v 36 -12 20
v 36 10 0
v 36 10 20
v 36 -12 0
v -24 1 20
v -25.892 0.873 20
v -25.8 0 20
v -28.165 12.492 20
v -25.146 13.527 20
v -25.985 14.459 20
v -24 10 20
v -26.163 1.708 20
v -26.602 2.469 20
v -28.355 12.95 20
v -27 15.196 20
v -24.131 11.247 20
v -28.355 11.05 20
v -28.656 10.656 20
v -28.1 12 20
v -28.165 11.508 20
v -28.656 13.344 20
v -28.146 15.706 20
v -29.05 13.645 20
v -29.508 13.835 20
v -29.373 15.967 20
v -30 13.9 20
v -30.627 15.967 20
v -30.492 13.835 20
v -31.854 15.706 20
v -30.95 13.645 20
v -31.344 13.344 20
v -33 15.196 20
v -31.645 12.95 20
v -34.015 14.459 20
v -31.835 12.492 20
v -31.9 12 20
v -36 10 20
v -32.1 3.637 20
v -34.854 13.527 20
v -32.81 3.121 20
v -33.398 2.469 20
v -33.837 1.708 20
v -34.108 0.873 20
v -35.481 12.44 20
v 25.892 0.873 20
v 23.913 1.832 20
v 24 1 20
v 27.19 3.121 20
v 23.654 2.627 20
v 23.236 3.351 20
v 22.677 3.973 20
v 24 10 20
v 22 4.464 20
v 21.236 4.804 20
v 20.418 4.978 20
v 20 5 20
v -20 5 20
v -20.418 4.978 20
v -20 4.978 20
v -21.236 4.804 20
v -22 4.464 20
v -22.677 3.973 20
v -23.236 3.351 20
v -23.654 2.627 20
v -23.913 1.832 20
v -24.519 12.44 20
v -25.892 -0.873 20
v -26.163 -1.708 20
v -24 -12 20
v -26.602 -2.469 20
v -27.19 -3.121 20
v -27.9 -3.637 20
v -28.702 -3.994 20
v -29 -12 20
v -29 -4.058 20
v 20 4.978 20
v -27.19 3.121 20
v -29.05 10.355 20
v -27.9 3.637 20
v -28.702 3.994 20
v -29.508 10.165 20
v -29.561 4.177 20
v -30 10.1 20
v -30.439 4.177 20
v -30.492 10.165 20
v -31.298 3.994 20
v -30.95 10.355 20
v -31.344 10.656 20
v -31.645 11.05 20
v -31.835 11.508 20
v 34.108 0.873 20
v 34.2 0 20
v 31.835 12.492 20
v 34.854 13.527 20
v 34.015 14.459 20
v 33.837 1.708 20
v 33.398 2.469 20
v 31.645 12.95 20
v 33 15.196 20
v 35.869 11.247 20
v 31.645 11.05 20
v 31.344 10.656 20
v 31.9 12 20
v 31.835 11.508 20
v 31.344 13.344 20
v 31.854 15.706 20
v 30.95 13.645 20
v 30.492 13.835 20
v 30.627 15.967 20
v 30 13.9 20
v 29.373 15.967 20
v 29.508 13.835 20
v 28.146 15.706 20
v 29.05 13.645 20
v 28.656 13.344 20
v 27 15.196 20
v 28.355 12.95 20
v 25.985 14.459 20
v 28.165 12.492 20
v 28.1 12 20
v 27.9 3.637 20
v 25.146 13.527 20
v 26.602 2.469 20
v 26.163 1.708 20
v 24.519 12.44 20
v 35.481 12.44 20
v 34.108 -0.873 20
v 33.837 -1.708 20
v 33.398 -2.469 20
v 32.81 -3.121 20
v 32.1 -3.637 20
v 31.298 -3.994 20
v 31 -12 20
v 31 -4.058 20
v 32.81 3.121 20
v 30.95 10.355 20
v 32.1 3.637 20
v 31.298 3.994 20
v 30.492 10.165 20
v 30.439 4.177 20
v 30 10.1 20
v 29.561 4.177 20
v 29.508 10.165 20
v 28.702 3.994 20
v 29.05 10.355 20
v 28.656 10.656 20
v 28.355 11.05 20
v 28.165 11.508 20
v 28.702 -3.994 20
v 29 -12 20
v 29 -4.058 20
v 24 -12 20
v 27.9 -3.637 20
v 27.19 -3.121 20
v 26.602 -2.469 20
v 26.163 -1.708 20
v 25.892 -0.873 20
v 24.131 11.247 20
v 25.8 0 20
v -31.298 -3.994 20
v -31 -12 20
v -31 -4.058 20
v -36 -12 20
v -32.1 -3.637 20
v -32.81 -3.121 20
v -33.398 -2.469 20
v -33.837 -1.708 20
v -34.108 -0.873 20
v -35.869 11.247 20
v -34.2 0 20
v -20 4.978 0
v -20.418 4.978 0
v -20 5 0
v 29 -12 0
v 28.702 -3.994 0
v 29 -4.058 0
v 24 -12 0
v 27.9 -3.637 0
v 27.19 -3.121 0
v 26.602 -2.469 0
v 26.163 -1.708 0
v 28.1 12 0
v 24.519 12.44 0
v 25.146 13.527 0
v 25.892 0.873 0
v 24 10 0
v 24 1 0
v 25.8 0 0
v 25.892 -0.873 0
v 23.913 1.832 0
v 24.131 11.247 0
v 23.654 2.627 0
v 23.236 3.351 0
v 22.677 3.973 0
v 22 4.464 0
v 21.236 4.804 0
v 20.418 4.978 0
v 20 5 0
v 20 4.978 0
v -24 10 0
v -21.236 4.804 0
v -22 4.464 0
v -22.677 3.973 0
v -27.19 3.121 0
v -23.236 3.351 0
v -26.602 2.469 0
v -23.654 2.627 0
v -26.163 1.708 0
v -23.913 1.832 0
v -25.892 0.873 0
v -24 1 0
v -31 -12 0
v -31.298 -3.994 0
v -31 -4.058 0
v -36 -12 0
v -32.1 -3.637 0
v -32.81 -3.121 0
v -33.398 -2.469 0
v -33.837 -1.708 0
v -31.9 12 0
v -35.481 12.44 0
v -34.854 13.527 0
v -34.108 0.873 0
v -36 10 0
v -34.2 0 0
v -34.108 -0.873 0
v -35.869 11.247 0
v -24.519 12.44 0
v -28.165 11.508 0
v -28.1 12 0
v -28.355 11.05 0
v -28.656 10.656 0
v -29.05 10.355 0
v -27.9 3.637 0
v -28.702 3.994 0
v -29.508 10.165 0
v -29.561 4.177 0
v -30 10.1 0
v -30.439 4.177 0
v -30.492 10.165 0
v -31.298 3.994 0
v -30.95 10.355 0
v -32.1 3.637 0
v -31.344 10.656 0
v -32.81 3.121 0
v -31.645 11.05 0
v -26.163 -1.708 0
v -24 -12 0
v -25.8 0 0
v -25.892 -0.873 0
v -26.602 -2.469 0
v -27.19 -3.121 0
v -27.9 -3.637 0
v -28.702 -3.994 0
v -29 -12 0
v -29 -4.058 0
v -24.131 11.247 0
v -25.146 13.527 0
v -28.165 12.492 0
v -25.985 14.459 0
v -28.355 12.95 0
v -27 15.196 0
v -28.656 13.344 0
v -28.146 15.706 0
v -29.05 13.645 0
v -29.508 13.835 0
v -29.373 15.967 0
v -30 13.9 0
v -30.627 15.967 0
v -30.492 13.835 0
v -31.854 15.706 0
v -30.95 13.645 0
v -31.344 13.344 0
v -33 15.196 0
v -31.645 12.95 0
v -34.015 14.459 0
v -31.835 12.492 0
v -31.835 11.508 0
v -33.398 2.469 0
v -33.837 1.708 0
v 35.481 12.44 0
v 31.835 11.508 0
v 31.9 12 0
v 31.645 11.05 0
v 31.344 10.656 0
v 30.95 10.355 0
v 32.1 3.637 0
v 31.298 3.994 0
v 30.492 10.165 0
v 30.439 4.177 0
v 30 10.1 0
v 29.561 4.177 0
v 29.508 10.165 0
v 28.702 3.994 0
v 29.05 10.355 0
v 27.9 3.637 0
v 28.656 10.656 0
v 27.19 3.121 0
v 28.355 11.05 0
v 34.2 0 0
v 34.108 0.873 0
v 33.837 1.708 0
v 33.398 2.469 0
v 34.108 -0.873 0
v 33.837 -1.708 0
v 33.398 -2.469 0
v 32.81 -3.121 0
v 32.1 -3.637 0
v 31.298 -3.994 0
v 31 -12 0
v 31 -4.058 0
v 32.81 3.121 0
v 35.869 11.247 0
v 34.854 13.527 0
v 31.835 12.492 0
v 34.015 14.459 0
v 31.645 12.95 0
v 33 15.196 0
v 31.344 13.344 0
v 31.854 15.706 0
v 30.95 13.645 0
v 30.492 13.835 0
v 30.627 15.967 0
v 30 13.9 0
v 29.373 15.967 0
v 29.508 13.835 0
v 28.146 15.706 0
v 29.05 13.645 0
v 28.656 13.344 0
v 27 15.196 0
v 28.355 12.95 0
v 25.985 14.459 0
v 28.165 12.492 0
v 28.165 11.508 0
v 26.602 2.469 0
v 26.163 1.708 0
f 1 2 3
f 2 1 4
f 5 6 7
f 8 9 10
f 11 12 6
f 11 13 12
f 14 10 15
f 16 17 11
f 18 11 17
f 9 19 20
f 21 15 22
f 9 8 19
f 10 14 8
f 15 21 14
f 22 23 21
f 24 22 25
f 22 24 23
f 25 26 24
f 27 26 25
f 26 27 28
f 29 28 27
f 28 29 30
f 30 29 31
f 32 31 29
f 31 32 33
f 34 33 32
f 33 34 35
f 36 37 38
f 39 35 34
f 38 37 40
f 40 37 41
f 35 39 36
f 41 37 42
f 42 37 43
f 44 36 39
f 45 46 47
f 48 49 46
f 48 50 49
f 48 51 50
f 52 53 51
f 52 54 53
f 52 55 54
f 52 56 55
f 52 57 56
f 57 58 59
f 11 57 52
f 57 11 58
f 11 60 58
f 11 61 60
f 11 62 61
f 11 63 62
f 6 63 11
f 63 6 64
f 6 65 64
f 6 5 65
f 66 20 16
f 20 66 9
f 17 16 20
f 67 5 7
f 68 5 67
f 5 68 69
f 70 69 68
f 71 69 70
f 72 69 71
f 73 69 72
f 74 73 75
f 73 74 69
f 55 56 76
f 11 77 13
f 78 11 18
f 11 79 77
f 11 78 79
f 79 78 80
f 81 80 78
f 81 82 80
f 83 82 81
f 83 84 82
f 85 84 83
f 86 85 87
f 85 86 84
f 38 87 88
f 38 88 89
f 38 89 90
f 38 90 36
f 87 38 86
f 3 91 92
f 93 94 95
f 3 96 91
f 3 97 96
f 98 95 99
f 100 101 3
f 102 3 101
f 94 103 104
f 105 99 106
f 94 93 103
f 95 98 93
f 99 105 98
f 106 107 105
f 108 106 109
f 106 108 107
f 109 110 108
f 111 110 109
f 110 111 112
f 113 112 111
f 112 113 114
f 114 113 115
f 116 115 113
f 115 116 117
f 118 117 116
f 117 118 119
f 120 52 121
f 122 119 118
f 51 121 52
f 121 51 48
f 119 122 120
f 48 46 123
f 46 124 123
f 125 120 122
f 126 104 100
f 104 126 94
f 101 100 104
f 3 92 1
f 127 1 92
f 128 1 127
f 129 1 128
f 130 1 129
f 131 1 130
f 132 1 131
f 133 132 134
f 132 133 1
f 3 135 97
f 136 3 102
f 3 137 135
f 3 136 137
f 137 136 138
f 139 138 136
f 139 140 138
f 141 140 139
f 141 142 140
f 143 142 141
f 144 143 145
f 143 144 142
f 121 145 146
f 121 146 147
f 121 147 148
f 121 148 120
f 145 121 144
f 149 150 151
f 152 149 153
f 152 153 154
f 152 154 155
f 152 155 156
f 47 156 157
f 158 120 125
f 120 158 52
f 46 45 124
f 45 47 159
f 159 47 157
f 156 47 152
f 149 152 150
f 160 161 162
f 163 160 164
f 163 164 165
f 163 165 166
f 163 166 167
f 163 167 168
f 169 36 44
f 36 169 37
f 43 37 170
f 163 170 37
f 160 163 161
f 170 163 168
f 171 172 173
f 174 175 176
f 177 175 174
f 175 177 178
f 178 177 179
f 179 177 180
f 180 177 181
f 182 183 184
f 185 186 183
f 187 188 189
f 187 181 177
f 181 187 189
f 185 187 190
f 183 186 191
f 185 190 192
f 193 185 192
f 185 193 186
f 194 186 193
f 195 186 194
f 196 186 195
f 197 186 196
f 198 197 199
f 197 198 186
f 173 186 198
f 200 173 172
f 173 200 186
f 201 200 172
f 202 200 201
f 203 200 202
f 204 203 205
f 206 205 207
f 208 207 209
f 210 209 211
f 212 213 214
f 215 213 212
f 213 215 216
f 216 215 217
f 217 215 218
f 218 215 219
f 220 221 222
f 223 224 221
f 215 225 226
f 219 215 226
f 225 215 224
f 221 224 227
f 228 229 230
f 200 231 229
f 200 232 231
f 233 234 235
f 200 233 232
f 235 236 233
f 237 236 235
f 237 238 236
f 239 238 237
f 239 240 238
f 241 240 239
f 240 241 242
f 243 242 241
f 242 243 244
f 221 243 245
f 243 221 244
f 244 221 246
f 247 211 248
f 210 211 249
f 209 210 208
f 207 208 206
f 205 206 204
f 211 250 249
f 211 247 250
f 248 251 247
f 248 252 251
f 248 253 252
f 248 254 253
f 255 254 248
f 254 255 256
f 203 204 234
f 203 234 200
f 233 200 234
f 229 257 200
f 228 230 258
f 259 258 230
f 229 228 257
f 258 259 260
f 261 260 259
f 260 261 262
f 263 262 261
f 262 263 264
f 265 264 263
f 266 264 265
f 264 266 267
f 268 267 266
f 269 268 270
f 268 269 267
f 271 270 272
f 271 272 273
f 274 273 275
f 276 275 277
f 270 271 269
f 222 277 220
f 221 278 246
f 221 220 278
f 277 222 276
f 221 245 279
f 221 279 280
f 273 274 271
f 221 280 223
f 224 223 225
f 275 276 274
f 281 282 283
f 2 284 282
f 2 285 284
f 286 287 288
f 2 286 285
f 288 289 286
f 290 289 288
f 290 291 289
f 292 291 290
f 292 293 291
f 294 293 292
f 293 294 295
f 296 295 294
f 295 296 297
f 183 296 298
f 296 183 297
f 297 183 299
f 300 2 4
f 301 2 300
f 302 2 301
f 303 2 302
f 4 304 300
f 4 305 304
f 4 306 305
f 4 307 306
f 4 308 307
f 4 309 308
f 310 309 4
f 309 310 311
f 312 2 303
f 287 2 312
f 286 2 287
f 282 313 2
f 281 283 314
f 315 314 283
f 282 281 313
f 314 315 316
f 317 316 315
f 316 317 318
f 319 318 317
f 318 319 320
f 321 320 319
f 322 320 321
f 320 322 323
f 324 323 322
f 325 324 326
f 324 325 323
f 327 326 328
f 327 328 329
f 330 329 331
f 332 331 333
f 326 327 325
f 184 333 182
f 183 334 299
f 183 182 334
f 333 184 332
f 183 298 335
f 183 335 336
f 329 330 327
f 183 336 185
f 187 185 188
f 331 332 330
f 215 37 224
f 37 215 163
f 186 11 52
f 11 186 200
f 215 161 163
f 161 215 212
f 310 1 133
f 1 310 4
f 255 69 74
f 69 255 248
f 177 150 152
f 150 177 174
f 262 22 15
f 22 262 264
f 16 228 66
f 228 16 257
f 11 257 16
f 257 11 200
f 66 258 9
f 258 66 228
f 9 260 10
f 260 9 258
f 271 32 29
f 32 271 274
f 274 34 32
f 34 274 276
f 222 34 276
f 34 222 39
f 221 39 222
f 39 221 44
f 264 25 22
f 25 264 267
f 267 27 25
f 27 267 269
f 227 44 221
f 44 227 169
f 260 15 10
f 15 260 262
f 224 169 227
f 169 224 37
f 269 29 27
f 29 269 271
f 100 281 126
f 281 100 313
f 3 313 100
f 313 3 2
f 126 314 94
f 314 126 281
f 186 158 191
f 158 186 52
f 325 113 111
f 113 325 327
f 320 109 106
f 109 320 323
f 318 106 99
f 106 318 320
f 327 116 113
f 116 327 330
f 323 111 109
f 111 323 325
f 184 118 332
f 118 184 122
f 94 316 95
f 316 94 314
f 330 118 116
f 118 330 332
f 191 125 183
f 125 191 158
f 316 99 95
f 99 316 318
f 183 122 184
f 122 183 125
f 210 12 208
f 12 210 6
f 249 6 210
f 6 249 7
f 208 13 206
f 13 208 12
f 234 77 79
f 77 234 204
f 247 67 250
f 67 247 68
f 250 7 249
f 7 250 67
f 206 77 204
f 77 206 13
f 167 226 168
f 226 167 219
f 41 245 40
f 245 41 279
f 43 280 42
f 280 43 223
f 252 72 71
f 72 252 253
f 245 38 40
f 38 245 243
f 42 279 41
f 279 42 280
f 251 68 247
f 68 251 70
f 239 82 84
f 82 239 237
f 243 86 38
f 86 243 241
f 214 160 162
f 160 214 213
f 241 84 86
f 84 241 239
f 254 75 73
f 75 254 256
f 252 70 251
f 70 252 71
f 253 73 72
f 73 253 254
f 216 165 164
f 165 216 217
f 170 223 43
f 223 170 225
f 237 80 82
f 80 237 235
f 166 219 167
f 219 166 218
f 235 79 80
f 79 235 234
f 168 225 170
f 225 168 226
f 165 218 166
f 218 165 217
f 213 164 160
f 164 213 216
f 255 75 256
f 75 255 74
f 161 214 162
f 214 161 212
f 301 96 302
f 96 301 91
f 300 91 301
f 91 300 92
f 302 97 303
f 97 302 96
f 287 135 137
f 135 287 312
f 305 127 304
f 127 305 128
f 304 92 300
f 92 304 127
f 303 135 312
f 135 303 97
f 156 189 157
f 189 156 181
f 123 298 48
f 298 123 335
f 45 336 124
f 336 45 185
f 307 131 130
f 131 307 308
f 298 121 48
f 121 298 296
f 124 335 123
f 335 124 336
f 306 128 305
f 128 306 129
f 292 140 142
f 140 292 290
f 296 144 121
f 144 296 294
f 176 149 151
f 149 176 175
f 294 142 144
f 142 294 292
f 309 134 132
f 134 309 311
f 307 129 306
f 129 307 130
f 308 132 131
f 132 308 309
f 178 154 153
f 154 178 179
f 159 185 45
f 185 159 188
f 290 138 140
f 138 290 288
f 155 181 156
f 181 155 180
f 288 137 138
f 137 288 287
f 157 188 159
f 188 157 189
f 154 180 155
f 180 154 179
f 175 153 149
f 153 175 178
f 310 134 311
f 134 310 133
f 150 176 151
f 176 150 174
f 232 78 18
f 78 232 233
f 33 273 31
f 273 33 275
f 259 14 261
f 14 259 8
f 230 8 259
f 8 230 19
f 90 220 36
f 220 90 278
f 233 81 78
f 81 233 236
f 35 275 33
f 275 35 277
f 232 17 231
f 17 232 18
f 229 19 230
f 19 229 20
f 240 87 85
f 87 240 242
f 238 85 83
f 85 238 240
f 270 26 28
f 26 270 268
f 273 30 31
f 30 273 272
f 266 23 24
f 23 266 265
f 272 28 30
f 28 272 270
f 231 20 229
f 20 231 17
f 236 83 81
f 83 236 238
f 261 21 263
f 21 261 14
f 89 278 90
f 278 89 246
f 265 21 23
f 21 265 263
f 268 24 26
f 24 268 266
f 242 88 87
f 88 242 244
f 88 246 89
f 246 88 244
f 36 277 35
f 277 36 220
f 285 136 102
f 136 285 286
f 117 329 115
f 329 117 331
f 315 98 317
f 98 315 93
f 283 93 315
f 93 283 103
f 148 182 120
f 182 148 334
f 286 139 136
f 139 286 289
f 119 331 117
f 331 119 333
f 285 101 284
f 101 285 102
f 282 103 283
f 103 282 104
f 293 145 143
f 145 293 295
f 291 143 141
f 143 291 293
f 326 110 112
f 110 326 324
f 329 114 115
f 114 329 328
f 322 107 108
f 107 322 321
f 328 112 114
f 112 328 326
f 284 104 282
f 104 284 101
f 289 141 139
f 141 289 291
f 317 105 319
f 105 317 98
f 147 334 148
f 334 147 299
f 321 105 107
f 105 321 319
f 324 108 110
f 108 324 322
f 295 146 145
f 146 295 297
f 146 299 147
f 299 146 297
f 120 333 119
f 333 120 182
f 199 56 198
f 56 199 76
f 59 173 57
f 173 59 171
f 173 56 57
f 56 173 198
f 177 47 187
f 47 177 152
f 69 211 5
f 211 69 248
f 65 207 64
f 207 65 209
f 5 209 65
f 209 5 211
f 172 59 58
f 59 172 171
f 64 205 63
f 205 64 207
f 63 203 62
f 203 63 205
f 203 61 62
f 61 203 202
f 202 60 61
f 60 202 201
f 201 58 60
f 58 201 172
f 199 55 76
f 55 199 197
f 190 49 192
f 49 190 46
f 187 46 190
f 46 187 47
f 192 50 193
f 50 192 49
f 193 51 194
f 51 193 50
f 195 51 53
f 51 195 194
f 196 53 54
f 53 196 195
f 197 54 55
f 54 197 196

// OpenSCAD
$fa = 12;
$fs = 0.5;

w = 60; // Smooth rod distance (center to center)

module screws() {
	for (x = [-w/2, w/2]) {
		translate([x, 0, 0]) {
			// Push-through M3 screw hole.
			translate([0, -6, 0]) rotate([0, 90, 0])
				cylinder(r=1.65, h=20, center=true);
			// M3 nut holder.
			translate([-x/5, -6, 0])
				rotate([30, 0, 0]) rotate([0, 90, 0])
				cylinder(r=3.2, h=2.3, center=true, $fn=6);
		}
	}
}

module bracket(h) {
	difference() {
		union() {
			translate([0, -1, 0]) cube([w+12, 22, h], center=true);
			// Sandwich mount.
			translate([-w/2, 10, 0]) cylinder(r=6, h=h, center=true);
			translate([w/2, 10, 0]) cylinder(r=6, h=h, center=true);
		}
		// Sandwich mount.
		translate([-w/2, 12, 0]) cylinder(r=1.9, h=h+1, center=true);
		translate([w/2, 12, 0]) cylinder(r=1.9, h=h+1, center=true);
		// Smooth rod mounting slots.
		for (x = [-w/2, w/2]) {
			translate([x, 0, 0]) {
				cylinder(r=4.2, h=h+1, center=true);
				translate([0, -10, 0]) cube([2, 20, h+1], center=true);
			}
		}
		// Belt path.
		translate([0, -5, 0]) cube([w-20, 20, h+1], center=true);
		translate([0, -9, 0]) cube([w-12, 20, h+1], center=true);
		translate([-w/2+10, 1, 0]) cylinder(r=4, h=h+1, center=true);
		translate([w/2-10, 1, 0]) cylinder(r=4, h=h+1, center=true);
	}
}

translate([0, 0, 10]) bracket(20);
